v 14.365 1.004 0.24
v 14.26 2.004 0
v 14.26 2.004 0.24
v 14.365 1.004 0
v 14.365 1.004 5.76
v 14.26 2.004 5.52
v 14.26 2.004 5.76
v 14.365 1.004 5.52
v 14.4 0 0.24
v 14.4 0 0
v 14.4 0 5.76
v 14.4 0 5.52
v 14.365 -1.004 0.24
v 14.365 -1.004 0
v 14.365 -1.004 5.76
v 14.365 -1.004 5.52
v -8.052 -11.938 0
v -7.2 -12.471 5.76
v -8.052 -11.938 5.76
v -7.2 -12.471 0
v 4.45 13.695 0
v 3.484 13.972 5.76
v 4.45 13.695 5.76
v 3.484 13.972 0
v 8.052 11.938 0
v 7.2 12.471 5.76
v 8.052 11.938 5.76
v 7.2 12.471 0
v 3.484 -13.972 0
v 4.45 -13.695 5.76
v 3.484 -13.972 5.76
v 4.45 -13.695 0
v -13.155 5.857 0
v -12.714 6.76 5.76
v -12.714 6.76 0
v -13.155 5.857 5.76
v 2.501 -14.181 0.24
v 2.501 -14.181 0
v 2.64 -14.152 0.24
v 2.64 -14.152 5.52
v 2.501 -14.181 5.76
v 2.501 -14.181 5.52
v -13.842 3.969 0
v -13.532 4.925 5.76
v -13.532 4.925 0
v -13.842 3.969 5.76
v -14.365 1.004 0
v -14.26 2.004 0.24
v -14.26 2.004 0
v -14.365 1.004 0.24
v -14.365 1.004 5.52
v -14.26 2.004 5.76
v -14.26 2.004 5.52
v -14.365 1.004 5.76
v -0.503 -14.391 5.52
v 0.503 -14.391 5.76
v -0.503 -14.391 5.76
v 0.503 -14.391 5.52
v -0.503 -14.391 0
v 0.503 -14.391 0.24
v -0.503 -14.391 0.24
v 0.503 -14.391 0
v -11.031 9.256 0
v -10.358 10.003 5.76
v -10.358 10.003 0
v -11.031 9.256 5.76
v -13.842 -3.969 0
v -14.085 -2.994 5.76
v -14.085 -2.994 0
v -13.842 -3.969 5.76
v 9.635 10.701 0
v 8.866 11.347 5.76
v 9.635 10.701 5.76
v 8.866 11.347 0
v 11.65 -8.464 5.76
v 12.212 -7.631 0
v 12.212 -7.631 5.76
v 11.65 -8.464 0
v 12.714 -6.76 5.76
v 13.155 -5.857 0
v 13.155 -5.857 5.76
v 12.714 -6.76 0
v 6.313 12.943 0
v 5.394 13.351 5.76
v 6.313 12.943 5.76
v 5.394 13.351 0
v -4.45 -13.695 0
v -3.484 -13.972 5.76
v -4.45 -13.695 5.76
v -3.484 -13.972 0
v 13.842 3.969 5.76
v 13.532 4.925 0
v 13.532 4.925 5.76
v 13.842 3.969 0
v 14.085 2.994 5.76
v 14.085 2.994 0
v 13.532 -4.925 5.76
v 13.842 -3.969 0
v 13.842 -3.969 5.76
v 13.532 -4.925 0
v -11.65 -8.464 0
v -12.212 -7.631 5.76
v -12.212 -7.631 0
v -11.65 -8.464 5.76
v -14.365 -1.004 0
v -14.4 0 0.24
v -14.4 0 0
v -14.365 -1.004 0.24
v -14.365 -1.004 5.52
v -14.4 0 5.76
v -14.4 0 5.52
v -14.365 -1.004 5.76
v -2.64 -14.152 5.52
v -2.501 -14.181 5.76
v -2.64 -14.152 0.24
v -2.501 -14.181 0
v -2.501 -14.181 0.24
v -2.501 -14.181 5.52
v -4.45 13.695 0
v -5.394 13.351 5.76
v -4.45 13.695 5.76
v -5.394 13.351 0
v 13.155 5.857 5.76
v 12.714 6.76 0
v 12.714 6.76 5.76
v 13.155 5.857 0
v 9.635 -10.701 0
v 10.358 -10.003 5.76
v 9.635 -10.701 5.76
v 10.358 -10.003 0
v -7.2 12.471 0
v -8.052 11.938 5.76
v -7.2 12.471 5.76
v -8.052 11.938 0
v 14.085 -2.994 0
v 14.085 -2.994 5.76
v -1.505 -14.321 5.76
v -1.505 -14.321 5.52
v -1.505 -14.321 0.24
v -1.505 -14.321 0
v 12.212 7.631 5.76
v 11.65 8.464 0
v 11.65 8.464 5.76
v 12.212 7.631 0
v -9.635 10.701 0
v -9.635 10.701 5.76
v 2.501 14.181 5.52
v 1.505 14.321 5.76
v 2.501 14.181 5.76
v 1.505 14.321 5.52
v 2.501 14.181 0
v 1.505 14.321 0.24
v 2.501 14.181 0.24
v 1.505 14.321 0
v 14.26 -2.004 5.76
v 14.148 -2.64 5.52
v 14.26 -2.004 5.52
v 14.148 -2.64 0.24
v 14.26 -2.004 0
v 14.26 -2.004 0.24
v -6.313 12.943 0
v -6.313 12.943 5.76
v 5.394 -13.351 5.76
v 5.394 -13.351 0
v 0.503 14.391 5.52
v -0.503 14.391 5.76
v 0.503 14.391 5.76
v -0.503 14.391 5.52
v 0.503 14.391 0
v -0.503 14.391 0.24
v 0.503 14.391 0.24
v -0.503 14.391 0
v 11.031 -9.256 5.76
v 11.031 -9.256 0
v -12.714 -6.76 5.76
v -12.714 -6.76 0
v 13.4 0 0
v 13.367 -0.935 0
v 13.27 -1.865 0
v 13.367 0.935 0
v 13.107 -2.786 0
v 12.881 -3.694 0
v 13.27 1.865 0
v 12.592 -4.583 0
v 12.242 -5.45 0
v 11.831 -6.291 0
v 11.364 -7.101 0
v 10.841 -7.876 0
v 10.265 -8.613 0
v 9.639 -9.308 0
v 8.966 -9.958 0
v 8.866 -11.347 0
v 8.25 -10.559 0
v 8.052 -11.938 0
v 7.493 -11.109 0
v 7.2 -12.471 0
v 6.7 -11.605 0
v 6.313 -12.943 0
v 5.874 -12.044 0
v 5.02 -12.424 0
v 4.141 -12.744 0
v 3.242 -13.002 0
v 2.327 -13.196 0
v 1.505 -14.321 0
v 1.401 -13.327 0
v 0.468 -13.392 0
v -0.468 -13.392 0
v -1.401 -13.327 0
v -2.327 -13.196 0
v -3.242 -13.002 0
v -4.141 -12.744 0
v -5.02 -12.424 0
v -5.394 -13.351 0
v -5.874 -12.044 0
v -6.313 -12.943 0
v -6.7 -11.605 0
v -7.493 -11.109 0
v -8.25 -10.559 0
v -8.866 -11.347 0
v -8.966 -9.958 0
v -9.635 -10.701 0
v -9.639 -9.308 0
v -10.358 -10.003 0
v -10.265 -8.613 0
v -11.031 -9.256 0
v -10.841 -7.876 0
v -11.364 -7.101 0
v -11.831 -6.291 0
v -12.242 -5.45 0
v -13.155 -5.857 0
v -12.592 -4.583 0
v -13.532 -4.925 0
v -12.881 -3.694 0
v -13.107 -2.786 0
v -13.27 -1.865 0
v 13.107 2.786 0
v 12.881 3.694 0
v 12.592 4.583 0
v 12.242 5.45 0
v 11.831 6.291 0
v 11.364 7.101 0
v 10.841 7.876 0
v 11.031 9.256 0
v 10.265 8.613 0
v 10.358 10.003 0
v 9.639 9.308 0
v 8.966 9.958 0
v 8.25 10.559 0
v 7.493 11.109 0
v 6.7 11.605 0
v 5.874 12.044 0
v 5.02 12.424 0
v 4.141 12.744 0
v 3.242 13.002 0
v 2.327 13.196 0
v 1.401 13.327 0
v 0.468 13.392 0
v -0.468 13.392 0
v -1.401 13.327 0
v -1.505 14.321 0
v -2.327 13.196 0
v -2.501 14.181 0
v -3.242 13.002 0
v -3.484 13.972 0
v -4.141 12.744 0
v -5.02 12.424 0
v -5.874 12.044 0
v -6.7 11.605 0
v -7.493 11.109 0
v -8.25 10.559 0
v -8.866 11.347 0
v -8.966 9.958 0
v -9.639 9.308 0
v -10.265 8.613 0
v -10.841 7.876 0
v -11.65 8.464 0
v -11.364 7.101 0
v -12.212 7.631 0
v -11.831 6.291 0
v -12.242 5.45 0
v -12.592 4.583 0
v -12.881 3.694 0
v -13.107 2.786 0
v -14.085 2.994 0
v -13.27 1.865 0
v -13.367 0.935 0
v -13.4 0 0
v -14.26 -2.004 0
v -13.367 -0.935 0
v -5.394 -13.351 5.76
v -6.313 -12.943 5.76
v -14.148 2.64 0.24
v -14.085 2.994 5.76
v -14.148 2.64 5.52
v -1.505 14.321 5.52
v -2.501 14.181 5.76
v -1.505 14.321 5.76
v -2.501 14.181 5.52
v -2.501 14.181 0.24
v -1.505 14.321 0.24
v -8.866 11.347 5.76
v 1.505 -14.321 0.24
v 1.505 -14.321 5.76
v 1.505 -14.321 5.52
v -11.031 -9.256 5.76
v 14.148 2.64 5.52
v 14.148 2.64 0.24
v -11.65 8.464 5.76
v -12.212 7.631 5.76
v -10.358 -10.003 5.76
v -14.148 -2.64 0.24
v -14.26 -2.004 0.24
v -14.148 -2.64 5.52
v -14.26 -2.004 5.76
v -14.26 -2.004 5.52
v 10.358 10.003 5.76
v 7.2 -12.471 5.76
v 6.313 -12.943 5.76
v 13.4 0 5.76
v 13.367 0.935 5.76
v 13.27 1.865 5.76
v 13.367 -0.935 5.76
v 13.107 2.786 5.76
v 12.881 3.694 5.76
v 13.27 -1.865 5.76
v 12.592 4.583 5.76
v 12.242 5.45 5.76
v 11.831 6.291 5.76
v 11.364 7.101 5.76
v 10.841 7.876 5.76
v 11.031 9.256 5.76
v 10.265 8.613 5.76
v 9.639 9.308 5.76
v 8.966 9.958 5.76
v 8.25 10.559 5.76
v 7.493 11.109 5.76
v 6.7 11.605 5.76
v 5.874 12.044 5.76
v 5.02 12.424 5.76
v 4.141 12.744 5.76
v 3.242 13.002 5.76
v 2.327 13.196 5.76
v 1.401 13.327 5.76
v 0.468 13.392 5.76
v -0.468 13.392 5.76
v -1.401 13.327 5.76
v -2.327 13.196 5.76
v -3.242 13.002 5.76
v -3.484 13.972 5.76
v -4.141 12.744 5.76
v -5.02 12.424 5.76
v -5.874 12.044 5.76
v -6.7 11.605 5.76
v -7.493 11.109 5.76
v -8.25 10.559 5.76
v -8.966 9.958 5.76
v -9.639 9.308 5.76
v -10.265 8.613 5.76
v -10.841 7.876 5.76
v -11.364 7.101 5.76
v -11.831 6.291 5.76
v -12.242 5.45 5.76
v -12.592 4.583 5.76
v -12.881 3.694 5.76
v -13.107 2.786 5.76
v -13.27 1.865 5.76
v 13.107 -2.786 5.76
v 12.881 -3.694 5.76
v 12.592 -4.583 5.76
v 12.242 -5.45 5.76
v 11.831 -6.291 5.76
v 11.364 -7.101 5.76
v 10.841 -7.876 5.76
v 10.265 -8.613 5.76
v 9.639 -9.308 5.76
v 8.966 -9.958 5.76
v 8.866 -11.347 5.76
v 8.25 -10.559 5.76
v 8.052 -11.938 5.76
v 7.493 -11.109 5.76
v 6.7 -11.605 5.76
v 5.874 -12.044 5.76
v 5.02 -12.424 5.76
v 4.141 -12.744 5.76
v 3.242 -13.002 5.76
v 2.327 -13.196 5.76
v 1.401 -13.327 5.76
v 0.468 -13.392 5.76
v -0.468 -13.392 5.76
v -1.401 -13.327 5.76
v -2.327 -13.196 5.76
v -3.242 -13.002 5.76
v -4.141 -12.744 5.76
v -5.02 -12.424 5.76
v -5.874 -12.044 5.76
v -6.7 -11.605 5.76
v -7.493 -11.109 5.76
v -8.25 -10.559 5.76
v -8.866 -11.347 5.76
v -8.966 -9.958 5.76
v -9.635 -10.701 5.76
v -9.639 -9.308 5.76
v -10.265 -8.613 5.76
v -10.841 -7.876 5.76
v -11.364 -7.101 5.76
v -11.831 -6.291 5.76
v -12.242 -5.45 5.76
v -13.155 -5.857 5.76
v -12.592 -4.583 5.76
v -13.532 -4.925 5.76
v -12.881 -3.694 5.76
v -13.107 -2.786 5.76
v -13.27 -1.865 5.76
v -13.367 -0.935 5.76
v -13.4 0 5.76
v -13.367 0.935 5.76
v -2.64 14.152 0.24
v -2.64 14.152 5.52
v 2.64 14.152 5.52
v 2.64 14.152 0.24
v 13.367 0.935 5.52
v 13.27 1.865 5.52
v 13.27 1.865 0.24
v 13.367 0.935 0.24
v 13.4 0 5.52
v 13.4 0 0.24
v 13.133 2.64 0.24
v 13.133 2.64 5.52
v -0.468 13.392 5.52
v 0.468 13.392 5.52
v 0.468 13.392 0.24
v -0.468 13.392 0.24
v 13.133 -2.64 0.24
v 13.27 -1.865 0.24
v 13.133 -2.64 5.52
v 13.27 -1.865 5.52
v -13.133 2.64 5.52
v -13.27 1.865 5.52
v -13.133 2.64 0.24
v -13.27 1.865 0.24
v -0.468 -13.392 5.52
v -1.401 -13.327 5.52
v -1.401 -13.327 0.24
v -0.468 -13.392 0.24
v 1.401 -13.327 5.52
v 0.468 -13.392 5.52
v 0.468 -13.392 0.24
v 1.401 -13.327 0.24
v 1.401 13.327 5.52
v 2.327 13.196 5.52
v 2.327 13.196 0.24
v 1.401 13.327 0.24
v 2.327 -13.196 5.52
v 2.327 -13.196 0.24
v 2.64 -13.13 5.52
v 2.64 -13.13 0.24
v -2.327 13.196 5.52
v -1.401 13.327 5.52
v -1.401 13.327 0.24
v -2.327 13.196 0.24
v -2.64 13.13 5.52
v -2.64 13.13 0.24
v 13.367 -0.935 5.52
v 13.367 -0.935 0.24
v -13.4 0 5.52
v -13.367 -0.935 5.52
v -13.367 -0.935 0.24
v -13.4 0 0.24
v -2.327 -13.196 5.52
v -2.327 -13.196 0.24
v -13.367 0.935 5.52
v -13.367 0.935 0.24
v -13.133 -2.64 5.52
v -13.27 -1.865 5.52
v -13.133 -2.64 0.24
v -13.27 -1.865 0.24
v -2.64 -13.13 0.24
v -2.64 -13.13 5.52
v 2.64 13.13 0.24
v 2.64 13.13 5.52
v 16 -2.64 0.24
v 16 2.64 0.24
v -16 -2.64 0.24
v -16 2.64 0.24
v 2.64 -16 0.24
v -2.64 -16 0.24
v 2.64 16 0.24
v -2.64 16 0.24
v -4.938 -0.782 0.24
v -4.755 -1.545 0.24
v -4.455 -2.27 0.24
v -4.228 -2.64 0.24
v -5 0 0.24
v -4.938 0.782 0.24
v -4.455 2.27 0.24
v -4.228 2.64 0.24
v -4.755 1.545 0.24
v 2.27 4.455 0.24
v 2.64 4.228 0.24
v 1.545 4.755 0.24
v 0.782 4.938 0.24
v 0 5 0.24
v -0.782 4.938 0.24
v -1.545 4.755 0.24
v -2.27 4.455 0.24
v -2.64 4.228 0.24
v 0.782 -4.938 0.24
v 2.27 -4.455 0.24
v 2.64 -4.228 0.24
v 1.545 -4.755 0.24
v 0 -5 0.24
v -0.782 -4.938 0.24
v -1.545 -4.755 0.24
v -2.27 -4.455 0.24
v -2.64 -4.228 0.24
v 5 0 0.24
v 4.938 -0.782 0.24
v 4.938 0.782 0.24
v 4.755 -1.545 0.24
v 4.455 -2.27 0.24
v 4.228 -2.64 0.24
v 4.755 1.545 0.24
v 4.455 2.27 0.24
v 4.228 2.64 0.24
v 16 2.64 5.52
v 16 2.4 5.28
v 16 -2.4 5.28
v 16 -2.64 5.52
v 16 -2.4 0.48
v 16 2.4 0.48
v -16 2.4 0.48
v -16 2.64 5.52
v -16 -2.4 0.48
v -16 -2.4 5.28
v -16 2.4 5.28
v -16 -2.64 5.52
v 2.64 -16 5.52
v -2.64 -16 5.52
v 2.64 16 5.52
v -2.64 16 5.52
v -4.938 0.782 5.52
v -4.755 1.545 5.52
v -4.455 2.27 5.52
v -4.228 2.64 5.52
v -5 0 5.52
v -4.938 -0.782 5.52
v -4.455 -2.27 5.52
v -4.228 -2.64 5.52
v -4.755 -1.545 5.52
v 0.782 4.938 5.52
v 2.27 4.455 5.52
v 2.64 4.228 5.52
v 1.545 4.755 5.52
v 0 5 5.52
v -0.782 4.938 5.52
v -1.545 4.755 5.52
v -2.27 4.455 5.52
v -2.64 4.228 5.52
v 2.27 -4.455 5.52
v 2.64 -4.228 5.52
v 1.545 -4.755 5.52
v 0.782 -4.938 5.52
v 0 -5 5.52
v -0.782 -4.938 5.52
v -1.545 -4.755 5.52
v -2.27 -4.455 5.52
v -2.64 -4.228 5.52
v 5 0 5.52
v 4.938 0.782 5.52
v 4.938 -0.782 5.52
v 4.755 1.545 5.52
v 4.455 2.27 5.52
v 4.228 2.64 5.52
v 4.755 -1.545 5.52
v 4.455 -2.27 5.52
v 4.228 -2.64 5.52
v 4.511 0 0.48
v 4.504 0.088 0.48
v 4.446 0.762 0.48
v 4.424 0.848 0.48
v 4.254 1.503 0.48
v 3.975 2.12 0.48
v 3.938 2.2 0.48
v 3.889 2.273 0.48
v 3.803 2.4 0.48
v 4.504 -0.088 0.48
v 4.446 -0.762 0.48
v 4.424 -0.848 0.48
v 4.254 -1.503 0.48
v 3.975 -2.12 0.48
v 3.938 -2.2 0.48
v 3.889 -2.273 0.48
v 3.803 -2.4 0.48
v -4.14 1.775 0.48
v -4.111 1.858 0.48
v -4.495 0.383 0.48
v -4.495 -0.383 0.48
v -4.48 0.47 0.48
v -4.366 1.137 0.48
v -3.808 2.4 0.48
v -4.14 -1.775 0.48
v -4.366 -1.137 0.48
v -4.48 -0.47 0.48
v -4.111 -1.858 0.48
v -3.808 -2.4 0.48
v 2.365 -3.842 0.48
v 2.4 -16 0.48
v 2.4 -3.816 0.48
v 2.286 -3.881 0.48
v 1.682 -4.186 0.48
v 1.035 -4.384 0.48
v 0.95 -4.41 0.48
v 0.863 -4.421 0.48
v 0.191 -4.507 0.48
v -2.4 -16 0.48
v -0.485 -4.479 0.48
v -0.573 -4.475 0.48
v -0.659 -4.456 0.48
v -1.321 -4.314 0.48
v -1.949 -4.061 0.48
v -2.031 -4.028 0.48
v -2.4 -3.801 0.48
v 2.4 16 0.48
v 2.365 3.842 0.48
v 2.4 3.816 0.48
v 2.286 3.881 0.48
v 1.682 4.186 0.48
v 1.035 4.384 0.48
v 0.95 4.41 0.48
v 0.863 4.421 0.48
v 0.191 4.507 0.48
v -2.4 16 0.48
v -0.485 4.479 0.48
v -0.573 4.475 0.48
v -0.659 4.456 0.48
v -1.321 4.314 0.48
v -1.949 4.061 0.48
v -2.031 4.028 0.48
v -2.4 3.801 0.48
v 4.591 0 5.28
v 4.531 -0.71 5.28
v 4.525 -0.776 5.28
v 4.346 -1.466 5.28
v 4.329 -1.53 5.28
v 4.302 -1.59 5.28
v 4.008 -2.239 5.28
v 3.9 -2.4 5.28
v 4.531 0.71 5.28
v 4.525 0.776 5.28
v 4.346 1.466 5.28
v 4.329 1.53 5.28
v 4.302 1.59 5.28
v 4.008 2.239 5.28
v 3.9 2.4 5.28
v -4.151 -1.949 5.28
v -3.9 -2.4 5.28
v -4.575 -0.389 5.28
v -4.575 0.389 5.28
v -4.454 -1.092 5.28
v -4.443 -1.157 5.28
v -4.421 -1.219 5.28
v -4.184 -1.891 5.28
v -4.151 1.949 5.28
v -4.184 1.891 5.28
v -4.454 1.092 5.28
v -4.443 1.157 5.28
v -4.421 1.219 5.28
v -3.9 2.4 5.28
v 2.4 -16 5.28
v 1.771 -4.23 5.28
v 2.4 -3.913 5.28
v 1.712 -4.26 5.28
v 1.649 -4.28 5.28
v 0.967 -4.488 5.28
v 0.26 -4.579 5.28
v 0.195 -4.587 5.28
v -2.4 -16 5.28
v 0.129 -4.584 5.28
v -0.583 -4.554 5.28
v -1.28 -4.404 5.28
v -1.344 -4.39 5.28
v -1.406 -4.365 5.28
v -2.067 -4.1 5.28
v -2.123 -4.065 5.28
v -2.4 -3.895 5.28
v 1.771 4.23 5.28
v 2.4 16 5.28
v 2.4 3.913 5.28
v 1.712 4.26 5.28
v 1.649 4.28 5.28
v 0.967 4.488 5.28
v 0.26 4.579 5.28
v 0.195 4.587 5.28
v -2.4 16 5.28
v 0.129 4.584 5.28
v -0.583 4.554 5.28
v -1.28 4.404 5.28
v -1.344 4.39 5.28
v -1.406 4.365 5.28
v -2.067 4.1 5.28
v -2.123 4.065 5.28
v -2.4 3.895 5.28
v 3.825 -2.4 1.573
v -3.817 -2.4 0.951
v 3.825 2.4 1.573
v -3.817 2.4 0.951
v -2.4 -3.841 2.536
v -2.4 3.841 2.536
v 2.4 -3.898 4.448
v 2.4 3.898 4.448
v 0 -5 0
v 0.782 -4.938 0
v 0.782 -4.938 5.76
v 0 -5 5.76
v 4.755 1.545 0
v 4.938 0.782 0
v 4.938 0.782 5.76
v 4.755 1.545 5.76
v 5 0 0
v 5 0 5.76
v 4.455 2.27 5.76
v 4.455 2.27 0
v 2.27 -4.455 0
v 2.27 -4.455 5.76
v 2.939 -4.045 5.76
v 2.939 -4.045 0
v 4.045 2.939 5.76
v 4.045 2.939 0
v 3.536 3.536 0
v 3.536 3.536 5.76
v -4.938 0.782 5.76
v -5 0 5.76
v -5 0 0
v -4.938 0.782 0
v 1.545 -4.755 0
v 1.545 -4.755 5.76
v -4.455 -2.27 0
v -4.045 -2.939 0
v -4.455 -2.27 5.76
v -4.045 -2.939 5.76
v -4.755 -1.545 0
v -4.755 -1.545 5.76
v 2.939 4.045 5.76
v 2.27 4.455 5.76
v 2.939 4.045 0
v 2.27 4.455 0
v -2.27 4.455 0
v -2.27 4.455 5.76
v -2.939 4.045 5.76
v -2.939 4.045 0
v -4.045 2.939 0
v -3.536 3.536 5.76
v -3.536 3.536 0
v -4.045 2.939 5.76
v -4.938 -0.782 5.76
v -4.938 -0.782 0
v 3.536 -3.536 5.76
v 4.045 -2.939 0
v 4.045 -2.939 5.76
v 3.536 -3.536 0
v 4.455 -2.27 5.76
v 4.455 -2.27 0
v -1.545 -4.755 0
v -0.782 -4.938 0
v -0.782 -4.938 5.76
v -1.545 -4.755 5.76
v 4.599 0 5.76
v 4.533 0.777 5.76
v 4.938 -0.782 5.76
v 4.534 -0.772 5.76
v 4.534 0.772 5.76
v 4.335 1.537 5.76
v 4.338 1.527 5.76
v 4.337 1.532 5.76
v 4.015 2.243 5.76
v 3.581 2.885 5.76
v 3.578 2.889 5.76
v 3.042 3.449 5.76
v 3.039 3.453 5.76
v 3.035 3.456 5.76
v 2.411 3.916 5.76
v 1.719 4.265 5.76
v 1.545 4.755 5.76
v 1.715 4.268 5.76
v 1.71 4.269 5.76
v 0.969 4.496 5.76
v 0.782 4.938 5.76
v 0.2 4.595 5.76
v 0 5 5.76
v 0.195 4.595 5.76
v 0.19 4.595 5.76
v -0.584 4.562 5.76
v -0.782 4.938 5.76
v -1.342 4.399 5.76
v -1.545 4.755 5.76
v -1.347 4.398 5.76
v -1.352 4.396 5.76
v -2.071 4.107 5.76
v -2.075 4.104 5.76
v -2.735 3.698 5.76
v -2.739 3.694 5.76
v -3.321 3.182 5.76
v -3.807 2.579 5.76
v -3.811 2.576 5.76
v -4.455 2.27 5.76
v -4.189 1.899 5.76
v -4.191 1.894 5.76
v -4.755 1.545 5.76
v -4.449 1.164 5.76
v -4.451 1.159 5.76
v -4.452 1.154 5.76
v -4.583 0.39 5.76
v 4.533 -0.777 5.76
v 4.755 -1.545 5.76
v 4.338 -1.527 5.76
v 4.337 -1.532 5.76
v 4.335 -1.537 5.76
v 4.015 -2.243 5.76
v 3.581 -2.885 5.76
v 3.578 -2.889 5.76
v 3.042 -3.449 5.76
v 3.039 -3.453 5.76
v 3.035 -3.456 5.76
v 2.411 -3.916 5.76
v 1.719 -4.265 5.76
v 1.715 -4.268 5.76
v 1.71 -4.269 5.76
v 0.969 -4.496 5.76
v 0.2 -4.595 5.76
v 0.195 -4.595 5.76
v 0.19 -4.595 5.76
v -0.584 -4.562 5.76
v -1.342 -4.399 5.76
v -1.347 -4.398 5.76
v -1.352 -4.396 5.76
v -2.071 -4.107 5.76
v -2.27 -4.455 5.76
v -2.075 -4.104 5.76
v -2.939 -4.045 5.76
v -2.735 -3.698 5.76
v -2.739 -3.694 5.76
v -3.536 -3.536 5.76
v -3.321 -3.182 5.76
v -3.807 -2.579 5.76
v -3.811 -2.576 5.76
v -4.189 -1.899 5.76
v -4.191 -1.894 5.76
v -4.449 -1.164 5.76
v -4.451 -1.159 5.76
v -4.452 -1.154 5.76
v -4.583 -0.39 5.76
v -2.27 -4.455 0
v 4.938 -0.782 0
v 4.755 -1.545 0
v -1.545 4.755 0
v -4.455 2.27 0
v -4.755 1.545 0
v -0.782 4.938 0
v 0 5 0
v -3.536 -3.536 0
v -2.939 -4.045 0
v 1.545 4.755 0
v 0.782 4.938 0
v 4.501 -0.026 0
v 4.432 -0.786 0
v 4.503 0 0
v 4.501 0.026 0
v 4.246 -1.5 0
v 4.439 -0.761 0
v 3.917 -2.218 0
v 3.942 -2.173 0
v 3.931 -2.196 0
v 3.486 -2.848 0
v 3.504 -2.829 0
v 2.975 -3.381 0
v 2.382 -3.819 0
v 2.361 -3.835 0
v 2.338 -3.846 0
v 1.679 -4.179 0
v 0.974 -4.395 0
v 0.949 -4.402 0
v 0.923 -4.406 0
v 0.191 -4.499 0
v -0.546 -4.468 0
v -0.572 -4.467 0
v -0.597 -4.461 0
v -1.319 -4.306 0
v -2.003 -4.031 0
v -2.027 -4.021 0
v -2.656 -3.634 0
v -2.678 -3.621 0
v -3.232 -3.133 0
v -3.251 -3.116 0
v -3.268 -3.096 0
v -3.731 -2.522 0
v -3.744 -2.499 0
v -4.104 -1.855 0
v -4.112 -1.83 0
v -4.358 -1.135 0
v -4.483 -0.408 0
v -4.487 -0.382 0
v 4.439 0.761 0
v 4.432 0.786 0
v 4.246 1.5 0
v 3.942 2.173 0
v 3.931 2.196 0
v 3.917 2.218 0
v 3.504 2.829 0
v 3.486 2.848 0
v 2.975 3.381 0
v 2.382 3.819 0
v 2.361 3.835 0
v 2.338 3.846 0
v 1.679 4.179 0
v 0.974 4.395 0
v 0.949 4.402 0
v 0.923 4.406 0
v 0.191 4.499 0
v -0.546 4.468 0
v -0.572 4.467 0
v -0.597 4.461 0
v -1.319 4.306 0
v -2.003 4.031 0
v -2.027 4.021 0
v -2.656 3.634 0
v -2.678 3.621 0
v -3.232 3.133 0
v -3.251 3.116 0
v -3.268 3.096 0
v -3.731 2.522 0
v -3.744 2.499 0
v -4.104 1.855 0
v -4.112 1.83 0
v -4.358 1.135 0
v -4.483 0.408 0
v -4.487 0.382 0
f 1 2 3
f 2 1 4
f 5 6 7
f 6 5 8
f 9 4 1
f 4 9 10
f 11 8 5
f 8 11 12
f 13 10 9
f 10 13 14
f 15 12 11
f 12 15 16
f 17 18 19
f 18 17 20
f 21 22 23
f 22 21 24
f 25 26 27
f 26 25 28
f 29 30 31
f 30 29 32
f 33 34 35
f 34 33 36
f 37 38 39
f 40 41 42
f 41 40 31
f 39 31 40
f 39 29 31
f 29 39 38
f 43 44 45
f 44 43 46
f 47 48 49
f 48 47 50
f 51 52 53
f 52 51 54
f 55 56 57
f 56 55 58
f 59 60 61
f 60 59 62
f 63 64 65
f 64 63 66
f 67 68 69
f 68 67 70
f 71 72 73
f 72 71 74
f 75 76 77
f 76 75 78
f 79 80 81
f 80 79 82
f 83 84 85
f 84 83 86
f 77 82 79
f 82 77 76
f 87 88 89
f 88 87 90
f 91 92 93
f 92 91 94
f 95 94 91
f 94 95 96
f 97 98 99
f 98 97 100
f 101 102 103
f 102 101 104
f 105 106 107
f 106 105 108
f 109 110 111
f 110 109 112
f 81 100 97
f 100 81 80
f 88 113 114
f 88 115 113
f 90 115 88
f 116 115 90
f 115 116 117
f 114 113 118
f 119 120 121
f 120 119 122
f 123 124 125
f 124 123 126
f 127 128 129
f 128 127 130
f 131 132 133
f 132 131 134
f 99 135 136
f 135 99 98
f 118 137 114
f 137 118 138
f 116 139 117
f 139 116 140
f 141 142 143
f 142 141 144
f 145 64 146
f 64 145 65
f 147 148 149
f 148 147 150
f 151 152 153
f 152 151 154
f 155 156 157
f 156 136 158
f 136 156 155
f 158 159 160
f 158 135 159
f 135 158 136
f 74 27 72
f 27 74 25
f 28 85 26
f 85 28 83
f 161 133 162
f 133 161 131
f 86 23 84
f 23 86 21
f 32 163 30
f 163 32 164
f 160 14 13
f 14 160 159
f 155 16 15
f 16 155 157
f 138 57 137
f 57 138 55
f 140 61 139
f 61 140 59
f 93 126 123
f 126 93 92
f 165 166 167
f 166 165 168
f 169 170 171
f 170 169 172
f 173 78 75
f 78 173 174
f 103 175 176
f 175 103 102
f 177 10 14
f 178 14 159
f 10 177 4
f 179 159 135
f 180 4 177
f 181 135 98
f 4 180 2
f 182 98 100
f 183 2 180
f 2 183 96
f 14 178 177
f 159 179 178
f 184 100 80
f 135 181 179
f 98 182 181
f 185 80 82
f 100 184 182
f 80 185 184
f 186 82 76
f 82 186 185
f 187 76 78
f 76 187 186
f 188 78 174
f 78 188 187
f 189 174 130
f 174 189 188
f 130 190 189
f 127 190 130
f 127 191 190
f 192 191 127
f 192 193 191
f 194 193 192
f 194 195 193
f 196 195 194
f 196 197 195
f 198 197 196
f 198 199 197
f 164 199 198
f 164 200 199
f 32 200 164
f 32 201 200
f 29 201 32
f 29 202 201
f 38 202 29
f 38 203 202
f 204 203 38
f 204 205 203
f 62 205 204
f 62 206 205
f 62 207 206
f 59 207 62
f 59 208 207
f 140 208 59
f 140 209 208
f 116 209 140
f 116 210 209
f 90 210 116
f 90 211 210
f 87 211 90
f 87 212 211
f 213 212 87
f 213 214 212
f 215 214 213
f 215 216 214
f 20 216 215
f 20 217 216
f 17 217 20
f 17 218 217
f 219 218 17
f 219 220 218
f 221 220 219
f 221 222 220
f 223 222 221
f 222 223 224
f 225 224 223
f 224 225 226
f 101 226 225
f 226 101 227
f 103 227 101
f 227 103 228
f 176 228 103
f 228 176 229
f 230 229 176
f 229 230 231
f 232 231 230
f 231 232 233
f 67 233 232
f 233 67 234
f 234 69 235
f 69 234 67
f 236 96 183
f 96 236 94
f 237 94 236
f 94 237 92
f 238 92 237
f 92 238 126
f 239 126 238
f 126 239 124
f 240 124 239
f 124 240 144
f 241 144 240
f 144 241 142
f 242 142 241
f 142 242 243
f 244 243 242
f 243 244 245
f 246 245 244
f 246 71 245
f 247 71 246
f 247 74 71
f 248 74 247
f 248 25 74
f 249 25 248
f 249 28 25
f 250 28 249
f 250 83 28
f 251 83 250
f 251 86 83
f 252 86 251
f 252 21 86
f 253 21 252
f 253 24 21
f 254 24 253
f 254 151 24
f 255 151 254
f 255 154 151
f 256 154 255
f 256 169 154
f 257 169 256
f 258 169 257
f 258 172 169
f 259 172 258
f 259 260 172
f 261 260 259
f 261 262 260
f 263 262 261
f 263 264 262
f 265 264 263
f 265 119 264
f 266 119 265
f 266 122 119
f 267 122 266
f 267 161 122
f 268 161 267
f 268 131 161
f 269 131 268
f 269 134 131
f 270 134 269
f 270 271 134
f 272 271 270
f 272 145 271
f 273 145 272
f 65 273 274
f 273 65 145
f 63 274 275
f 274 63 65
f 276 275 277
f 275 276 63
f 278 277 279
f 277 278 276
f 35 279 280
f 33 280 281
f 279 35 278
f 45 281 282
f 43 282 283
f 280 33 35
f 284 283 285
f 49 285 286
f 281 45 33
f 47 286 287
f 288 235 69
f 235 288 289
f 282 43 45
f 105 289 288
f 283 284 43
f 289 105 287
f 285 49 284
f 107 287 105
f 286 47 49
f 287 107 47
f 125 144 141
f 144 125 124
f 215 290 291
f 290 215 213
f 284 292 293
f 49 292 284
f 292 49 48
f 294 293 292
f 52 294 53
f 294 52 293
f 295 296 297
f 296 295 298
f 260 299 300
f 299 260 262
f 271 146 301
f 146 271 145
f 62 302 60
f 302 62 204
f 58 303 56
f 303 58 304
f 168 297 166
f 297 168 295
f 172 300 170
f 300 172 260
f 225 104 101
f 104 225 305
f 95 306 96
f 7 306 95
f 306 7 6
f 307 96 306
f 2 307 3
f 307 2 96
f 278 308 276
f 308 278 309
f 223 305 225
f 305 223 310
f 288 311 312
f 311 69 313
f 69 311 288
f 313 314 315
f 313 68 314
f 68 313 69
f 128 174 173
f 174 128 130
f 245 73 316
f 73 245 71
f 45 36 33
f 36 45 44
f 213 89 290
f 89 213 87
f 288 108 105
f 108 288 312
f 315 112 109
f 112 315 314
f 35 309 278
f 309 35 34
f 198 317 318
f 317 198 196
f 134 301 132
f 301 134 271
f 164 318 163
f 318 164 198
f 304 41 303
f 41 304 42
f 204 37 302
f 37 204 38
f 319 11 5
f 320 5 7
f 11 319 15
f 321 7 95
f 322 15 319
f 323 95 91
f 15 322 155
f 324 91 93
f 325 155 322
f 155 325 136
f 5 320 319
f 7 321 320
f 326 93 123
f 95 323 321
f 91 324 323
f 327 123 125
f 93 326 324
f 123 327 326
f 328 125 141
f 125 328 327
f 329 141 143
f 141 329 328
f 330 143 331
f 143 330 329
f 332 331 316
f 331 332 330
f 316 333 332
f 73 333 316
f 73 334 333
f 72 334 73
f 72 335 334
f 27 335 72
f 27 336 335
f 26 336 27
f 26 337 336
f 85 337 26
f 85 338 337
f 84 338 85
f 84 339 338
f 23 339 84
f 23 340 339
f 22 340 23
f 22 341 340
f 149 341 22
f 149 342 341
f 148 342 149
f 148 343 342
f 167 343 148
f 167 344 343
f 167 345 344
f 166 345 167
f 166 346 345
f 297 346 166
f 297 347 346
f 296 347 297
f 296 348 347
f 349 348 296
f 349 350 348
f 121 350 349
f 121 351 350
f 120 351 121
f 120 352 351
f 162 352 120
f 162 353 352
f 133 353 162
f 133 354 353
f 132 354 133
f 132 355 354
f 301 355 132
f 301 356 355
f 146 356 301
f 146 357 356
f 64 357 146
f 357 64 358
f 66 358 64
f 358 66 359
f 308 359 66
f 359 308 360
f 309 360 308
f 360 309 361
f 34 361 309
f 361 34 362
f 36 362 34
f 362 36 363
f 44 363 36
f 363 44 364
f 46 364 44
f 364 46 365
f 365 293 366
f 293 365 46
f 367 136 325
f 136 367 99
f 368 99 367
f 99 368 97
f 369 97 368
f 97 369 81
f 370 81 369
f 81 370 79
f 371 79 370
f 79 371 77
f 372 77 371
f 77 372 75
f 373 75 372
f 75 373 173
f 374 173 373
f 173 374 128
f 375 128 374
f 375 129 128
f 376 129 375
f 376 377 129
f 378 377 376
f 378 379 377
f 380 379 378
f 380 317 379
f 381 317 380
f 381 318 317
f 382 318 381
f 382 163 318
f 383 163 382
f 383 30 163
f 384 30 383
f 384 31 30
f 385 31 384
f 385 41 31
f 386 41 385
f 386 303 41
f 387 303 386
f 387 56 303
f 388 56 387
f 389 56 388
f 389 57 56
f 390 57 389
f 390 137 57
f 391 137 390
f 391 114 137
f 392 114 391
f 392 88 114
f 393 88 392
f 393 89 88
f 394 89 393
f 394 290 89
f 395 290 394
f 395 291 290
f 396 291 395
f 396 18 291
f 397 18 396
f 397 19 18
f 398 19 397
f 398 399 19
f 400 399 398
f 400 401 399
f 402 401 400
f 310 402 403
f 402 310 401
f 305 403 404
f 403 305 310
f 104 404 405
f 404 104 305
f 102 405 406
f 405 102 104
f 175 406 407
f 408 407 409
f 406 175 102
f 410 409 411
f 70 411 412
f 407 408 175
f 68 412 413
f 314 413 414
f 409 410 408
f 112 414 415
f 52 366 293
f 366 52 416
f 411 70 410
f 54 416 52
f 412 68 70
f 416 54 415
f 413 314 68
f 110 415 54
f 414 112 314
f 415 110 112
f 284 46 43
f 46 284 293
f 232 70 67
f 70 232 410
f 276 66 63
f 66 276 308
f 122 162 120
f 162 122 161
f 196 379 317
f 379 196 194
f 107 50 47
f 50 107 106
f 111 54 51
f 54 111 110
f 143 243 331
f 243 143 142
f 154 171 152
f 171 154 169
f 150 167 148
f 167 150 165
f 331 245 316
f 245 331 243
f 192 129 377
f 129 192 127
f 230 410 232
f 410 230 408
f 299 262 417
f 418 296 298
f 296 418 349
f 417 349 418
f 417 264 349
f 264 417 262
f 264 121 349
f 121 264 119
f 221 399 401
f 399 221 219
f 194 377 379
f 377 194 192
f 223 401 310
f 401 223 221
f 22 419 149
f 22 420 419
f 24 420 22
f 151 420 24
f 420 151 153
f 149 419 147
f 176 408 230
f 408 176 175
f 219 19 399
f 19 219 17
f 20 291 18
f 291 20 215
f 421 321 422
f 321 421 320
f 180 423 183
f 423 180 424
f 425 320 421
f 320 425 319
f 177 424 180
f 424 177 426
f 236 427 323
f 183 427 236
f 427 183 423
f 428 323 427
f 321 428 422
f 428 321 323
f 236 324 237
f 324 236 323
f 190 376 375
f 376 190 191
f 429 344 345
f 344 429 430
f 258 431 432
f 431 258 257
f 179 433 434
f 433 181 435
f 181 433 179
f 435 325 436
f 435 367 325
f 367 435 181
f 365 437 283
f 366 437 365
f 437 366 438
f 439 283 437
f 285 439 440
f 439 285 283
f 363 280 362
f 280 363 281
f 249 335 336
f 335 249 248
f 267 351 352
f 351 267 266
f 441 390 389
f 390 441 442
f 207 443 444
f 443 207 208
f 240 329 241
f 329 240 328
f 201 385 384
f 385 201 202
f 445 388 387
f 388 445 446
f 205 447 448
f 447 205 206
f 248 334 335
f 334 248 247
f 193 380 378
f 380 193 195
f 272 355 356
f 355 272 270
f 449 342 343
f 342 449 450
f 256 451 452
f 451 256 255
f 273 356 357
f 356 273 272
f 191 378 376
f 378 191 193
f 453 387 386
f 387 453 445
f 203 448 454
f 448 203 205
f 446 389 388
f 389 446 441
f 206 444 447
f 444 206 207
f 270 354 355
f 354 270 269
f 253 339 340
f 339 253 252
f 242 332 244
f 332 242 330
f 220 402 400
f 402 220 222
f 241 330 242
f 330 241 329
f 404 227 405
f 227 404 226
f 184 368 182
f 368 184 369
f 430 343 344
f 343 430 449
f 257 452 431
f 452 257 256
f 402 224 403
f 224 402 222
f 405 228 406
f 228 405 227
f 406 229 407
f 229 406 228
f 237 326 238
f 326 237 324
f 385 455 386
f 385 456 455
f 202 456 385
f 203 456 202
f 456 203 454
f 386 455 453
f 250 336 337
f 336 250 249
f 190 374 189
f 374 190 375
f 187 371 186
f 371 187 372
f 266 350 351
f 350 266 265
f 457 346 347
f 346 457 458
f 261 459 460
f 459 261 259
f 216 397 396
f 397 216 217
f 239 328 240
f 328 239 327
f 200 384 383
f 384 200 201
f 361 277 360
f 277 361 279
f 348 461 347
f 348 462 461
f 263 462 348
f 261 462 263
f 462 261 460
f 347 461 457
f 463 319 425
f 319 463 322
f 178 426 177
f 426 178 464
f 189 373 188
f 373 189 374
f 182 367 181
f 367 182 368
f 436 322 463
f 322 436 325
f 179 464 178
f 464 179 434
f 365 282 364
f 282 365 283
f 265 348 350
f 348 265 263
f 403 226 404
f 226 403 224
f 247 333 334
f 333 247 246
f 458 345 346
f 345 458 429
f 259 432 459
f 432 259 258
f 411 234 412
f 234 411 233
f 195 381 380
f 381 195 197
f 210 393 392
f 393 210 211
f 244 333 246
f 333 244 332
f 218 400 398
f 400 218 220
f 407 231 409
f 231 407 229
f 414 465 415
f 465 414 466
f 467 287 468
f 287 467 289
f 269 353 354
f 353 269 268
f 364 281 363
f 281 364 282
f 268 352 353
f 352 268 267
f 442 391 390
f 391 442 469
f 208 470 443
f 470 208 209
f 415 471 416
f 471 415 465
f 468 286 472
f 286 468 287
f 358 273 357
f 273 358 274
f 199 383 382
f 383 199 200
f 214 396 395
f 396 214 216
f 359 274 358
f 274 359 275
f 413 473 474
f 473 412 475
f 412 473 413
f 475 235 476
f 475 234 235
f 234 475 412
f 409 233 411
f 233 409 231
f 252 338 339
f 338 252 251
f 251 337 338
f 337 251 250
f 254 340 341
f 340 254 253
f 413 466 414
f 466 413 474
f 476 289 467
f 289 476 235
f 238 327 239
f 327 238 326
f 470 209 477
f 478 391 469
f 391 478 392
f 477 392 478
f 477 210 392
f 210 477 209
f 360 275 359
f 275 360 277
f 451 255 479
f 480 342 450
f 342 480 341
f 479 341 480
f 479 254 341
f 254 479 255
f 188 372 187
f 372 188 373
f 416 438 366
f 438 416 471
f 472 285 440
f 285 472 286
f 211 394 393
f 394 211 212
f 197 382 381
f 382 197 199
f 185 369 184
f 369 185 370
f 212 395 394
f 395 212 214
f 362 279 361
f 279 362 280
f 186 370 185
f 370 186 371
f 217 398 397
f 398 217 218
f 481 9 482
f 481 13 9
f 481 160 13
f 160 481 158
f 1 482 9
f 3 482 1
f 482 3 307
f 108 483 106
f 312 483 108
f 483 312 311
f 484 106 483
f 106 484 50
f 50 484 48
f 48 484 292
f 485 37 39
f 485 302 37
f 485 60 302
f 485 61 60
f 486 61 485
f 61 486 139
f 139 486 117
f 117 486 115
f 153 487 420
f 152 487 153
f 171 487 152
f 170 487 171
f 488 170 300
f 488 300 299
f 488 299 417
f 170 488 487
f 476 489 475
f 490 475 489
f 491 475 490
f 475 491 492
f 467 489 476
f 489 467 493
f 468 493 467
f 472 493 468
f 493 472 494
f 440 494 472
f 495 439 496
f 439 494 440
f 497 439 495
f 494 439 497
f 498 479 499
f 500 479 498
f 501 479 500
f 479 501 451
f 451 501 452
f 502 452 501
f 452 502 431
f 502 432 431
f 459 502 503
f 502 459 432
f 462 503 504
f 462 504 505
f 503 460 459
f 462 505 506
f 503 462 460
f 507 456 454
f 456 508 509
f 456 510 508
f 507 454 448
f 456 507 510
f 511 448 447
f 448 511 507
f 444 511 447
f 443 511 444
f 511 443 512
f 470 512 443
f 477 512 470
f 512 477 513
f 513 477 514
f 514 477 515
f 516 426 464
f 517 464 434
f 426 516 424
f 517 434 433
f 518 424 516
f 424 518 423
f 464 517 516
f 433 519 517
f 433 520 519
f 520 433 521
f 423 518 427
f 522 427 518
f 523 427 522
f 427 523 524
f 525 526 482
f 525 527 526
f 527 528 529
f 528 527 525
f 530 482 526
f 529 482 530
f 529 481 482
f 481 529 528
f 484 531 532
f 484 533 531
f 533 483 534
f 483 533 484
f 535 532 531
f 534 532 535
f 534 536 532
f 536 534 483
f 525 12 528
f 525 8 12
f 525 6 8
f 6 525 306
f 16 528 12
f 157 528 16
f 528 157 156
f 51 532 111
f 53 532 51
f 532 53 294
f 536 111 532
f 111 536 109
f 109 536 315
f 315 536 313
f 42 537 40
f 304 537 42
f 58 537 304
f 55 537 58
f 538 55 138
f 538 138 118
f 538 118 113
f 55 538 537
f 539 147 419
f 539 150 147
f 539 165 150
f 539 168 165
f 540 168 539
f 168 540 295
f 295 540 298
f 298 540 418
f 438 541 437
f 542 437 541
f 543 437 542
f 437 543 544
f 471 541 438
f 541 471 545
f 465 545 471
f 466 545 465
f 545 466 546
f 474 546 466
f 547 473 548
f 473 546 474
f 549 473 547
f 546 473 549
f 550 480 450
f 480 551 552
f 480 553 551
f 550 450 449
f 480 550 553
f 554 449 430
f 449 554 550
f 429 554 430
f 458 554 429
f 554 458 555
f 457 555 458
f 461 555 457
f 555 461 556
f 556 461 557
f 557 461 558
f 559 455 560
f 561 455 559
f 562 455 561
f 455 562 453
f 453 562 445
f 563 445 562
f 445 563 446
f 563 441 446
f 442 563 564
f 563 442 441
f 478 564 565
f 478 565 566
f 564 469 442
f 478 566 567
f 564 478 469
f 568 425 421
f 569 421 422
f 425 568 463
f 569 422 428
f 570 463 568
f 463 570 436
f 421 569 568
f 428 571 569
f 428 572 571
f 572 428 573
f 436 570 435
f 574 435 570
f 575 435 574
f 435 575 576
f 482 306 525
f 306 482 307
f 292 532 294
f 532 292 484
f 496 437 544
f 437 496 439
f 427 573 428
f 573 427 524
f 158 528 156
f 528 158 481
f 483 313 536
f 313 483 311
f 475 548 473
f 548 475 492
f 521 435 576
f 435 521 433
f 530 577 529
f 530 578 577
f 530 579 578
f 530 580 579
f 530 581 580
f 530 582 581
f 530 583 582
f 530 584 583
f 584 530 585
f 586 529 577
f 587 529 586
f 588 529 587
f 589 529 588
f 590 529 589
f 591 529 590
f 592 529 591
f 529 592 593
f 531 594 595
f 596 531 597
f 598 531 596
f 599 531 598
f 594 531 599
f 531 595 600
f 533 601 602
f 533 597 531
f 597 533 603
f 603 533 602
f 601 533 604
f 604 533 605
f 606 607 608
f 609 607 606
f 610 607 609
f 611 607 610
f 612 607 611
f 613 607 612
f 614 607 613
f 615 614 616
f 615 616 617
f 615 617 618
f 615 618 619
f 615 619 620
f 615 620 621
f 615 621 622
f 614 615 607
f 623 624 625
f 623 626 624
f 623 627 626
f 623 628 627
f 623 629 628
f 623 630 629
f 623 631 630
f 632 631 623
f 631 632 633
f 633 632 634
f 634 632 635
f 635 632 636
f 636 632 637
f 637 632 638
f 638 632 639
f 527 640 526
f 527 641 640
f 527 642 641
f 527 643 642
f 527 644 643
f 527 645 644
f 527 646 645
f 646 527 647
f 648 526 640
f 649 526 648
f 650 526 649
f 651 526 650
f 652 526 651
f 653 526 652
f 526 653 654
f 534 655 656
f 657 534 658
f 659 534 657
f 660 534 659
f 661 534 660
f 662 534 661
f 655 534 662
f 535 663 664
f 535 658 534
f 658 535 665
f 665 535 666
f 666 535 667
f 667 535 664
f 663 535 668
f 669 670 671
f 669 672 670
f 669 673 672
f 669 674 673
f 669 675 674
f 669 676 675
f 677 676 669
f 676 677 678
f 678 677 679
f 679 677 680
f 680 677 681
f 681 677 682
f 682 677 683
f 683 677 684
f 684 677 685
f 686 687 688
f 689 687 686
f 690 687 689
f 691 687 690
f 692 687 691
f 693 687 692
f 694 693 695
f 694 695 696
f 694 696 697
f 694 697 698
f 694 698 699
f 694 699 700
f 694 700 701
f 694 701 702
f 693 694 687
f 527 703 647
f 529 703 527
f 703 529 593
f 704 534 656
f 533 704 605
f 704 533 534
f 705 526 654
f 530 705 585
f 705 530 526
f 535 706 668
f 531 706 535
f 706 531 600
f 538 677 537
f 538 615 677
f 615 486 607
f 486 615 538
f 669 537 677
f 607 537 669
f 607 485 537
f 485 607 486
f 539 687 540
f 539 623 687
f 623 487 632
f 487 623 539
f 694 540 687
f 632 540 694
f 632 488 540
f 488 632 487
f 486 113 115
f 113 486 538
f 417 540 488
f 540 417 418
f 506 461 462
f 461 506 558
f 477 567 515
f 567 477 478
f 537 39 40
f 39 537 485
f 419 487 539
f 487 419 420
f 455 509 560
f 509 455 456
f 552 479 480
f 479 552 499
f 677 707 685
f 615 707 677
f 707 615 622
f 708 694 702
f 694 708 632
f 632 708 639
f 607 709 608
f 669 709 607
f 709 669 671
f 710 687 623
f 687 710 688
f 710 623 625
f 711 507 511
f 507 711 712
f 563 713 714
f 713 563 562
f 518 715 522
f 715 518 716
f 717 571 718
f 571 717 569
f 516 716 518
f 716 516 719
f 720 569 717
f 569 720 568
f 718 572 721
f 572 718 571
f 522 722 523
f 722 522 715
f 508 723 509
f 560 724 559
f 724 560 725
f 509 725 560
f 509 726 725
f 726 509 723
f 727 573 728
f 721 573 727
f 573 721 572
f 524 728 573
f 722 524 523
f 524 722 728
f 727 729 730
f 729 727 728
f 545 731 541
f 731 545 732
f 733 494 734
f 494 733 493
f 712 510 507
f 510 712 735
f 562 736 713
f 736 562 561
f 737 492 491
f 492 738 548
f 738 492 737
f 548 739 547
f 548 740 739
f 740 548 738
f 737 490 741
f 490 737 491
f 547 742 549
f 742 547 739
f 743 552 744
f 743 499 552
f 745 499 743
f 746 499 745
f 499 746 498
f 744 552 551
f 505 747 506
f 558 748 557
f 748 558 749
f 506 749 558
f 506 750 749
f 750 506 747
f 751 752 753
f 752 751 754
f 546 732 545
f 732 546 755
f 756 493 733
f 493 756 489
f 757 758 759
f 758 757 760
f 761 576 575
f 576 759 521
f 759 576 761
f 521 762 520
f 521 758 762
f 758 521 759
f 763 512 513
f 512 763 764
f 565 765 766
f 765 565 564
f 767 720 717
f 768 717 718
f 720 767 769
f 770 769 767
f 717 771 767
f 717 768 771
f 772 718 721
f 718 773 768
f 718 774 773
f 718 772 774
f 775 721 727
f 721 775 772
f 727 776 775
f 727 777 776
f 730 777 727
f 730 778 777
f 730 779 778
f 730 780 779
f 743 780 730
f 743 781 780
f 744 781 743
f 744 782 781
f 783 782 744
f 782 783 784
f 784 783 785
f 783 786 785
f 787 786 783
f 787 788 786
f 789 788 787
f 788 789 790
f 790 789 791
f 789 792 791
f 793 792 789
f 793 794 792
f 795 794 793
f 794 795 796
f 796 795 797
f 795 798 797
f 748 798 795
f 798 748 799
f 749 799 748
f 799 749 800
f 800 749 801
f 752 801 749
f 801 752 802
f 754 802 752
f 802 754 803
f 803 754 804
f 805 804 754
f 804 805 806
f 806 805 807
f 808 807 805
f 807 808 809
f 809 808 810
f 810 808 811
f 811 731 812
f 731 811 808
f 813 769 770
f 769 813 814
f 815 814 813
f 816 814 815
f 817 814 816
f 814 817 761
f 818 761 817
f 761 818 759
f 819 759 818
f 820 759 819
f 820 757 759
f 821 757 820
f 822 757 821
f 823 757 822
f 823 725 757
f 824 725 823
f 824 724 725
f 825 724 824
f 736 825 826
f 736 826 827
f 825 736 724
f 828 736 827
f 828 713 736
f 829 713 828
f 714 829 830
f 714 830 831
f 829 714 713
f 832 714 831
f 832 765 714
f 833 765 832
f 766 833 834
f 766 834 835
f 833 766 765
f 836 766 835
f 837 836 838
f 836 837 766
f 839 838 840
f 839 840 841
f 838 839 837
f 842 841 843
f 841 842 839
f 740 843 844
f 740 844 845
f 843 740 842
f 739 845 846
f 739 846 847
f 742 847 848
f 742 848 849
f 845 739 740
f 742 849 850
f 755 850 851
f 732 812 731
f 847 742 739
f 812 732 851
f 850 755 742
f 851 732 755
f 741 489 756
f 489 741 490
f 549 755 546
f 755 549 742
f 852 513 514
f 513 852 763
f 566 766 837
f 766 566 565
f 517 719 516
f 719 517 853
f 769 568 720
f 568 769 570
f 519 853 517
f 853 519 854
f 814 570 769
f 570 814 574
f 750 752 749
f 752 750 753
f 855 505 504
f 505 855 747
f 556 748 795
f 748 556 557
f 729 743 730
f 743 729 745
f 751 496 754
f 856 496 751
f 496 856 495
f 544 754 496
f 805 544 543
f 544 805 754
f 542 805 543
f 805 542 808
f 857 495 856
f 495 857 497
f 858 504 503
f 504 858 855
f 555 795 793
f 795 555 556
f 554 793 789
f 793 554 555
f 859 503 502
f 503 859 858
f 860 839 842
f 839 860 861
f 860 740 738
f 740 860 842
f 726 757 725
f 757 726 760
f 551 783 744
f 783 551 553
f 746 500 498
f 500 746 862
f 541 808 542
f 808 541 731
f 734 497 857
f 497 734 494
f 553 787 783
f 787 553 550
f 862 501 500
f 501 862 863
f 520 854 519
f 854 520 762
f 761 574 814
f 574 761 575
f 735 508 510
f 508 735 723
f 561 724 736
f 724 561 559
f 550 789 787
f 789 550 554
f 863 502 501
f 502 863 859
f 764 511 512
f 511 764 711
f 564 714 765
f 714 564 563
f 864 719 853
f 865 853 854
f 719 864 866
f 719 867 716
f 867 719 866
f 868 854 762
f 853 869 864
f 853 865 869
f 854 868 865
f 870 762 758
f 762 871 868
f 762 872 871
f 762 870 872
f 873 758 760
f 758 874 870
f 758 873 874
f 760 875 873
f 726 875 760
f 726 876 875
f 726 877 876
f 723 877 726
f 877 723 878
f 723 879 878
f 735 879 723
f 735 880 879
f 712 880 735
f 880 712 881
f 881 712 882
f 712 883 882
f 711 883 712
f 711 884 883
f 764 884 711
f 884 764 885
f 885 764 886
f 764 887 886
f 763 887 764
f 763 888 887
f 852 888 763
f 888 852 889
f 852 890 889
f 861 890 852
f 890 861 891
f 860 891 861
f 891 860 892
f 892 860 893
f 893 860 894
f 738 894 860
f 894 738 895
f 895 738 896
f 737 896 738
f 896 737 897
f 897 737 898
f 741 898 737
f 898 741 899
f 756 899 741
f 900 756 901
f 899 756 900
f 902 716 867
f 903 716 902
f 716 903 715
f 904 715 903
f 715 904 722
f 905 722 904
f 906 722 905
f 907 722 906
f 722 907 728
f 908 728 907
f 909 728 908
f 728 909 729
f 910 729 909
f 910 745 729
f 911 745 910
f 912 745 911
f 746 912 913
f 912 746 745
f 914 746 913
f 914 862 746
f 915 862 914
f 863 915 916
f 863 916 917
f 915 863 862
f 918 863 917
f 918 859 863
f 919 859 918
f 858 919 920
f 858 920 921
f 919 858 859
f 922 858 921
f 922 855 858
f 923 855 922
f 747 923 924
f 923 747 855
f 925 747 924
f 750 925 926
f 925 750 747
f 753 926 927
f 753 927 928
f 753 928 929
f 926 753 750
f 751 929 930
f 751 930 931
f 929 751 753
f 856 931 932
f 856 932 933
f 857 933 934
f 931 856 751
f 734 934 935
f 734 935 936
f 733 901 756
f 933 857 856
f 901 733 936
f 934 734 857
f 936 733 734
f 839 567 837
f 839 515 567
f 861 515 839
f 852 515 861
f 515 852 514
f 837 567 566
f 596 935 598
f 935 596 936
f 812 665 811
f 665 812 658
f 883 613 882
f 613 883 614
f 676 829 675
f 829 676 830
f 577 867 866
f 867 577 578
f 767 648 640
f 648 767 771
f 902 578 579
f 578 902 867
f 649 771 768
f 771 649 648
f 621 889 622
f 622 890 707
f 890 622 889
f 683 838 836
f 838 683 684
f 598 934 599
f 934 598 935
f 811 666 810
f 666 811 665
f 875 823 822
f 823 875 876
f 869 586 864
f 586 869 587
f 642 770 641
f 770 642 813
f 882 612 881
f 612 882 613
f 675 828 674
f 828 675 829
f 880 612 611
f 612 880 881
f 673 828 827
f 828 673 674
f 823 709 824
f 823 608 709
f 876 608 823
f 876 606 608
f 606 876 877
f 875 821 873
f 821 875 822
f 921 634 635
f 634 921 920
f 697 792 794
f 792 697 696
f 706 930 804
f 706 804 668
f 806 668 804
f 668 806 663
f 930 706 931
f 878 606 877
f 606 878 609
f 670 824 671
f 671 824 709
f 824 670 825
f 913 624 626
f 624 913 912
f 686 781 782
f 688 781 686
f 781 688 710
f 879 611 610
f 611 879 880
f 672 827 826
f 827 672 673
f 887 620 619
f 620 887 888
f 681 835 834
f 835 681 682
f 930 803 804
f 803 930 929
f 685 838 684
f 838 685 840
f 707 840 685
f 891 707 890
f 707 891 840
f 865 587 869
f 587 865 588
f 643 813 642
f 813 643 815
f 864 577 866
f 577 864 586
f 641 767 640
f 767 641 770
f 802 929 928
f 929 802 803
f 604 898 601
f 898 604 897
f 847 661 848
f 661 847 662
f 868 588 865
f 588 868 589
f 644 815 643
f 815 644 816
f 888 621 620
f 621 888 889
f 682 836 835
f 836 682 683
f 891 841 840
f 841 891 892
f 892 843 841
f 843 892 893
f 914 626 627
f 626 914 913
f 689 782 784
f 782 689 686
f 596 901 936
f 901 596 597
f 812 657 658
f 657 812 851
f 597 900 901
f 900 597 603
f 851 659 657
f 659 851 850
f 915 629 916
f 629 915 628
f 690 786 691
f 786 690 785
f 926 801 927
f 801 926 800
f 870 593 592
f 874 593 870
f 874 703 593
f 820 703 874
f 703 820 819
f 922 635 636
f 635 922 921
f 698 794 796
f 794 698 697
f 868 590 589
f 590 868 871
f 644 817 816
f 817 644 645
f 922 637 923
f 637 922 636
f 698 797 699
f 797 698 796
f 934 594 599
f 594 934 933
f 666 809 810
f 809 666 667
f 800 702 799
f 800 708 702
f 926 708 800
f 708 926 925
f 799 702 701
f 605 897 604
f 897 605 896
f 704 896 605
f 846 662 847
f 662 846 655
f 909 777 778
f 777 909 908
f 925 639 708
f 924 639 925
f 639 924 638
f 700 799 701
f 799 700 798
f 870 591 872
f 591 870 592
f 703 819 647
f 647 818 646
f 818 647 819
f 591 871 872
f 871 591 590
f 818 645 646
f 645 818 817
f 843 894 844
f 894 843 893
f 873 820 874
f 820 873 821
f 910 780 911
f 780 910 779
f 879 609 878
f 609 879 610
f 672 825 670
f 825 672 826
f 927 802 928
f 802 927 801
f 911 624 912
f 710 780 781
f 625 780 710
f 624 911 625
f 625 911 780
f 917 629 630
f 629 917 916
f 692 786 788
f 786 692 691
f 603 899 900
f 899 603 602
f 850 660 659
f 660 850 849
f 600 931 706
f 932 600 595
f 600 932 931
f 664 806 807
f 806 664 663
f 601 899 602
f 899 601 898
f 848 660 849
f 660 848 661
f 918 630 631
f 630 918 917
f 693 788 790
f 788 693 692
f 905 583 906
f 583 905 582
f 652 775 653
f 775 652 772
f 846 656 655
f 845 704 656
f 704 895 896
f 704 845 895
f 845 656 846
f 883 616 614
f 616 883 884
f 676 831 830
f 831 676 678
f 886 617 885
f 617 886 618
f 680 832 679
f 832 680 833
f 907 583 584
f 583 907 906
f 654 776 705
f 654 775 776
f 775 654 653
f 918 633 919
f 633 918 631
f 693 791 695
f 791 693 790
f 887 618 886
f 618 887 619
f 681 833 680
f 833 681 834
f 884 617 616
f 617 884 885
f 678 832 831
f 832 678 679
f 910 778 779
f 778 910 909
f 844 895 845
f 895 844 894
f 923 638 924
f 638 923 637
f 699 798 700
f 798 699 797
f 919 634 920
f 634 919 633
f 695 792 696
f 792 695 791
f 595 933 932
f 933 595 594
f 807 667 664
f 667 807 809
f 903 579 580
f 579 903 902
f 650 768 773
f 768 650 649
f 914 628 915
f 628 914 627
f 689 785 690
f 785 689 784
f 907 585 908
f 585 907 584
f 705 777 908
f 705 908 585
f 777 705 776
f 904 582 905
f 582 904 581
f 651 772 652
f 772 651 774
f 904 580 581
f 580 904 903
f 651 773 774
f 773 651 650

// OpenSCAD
$fs=0.8; // def 1, 0.2 is high res
$fa=4;//def 12, 3 is very nice
%translate([0,0,-0.5])cube([200,200,1],center=true); //build platform

lyr = 0.24;
armsize = 4.8;

difference() {
union() {
//body
difference() {
	cylinder (armsize + (lyr*4),14.4,14.4);
	translate([0,0,-.2])cylinder (6,13.4,13.4);

}

//arms
difference() {
	translate([0,0,(armsize/2) + (lyr*2)]) rotate([0,90,0]) cube([armsize+ (lyr*2),armsize+ (lyr*2),32], true);
	translate([0,0,(armsize/2) + (lyr*2)]) rotate([0,90,0]) cube([armsize,armsize,32], true);
}

difference() {
	translate([0,0,(armsize/2) + (lyr*2)]) rotate([90,90,0]) cube([armsize+ (lyr*2),armsize+ (lyr*2),32], true);
	translate([0,0,(armsize/2) + (lyr*2)]) rotate([90,90,0]) cube([armsize,armsize,32], true);
}


	cylinder (armsize + (lyr*4),5,5);
}
	translate([0,0,-.2])cylinder (6,4.5,4.6);
	translate([0,0,(armsize/2) + (lyr*2)]) rotate([0,90,0]) cube([armsize,armsize,32], true);
	translate([0,0,(armsize/2) + (lyr*2)]) rotate([90,90,0]) cube([armsize,armsize,32], true);
}
